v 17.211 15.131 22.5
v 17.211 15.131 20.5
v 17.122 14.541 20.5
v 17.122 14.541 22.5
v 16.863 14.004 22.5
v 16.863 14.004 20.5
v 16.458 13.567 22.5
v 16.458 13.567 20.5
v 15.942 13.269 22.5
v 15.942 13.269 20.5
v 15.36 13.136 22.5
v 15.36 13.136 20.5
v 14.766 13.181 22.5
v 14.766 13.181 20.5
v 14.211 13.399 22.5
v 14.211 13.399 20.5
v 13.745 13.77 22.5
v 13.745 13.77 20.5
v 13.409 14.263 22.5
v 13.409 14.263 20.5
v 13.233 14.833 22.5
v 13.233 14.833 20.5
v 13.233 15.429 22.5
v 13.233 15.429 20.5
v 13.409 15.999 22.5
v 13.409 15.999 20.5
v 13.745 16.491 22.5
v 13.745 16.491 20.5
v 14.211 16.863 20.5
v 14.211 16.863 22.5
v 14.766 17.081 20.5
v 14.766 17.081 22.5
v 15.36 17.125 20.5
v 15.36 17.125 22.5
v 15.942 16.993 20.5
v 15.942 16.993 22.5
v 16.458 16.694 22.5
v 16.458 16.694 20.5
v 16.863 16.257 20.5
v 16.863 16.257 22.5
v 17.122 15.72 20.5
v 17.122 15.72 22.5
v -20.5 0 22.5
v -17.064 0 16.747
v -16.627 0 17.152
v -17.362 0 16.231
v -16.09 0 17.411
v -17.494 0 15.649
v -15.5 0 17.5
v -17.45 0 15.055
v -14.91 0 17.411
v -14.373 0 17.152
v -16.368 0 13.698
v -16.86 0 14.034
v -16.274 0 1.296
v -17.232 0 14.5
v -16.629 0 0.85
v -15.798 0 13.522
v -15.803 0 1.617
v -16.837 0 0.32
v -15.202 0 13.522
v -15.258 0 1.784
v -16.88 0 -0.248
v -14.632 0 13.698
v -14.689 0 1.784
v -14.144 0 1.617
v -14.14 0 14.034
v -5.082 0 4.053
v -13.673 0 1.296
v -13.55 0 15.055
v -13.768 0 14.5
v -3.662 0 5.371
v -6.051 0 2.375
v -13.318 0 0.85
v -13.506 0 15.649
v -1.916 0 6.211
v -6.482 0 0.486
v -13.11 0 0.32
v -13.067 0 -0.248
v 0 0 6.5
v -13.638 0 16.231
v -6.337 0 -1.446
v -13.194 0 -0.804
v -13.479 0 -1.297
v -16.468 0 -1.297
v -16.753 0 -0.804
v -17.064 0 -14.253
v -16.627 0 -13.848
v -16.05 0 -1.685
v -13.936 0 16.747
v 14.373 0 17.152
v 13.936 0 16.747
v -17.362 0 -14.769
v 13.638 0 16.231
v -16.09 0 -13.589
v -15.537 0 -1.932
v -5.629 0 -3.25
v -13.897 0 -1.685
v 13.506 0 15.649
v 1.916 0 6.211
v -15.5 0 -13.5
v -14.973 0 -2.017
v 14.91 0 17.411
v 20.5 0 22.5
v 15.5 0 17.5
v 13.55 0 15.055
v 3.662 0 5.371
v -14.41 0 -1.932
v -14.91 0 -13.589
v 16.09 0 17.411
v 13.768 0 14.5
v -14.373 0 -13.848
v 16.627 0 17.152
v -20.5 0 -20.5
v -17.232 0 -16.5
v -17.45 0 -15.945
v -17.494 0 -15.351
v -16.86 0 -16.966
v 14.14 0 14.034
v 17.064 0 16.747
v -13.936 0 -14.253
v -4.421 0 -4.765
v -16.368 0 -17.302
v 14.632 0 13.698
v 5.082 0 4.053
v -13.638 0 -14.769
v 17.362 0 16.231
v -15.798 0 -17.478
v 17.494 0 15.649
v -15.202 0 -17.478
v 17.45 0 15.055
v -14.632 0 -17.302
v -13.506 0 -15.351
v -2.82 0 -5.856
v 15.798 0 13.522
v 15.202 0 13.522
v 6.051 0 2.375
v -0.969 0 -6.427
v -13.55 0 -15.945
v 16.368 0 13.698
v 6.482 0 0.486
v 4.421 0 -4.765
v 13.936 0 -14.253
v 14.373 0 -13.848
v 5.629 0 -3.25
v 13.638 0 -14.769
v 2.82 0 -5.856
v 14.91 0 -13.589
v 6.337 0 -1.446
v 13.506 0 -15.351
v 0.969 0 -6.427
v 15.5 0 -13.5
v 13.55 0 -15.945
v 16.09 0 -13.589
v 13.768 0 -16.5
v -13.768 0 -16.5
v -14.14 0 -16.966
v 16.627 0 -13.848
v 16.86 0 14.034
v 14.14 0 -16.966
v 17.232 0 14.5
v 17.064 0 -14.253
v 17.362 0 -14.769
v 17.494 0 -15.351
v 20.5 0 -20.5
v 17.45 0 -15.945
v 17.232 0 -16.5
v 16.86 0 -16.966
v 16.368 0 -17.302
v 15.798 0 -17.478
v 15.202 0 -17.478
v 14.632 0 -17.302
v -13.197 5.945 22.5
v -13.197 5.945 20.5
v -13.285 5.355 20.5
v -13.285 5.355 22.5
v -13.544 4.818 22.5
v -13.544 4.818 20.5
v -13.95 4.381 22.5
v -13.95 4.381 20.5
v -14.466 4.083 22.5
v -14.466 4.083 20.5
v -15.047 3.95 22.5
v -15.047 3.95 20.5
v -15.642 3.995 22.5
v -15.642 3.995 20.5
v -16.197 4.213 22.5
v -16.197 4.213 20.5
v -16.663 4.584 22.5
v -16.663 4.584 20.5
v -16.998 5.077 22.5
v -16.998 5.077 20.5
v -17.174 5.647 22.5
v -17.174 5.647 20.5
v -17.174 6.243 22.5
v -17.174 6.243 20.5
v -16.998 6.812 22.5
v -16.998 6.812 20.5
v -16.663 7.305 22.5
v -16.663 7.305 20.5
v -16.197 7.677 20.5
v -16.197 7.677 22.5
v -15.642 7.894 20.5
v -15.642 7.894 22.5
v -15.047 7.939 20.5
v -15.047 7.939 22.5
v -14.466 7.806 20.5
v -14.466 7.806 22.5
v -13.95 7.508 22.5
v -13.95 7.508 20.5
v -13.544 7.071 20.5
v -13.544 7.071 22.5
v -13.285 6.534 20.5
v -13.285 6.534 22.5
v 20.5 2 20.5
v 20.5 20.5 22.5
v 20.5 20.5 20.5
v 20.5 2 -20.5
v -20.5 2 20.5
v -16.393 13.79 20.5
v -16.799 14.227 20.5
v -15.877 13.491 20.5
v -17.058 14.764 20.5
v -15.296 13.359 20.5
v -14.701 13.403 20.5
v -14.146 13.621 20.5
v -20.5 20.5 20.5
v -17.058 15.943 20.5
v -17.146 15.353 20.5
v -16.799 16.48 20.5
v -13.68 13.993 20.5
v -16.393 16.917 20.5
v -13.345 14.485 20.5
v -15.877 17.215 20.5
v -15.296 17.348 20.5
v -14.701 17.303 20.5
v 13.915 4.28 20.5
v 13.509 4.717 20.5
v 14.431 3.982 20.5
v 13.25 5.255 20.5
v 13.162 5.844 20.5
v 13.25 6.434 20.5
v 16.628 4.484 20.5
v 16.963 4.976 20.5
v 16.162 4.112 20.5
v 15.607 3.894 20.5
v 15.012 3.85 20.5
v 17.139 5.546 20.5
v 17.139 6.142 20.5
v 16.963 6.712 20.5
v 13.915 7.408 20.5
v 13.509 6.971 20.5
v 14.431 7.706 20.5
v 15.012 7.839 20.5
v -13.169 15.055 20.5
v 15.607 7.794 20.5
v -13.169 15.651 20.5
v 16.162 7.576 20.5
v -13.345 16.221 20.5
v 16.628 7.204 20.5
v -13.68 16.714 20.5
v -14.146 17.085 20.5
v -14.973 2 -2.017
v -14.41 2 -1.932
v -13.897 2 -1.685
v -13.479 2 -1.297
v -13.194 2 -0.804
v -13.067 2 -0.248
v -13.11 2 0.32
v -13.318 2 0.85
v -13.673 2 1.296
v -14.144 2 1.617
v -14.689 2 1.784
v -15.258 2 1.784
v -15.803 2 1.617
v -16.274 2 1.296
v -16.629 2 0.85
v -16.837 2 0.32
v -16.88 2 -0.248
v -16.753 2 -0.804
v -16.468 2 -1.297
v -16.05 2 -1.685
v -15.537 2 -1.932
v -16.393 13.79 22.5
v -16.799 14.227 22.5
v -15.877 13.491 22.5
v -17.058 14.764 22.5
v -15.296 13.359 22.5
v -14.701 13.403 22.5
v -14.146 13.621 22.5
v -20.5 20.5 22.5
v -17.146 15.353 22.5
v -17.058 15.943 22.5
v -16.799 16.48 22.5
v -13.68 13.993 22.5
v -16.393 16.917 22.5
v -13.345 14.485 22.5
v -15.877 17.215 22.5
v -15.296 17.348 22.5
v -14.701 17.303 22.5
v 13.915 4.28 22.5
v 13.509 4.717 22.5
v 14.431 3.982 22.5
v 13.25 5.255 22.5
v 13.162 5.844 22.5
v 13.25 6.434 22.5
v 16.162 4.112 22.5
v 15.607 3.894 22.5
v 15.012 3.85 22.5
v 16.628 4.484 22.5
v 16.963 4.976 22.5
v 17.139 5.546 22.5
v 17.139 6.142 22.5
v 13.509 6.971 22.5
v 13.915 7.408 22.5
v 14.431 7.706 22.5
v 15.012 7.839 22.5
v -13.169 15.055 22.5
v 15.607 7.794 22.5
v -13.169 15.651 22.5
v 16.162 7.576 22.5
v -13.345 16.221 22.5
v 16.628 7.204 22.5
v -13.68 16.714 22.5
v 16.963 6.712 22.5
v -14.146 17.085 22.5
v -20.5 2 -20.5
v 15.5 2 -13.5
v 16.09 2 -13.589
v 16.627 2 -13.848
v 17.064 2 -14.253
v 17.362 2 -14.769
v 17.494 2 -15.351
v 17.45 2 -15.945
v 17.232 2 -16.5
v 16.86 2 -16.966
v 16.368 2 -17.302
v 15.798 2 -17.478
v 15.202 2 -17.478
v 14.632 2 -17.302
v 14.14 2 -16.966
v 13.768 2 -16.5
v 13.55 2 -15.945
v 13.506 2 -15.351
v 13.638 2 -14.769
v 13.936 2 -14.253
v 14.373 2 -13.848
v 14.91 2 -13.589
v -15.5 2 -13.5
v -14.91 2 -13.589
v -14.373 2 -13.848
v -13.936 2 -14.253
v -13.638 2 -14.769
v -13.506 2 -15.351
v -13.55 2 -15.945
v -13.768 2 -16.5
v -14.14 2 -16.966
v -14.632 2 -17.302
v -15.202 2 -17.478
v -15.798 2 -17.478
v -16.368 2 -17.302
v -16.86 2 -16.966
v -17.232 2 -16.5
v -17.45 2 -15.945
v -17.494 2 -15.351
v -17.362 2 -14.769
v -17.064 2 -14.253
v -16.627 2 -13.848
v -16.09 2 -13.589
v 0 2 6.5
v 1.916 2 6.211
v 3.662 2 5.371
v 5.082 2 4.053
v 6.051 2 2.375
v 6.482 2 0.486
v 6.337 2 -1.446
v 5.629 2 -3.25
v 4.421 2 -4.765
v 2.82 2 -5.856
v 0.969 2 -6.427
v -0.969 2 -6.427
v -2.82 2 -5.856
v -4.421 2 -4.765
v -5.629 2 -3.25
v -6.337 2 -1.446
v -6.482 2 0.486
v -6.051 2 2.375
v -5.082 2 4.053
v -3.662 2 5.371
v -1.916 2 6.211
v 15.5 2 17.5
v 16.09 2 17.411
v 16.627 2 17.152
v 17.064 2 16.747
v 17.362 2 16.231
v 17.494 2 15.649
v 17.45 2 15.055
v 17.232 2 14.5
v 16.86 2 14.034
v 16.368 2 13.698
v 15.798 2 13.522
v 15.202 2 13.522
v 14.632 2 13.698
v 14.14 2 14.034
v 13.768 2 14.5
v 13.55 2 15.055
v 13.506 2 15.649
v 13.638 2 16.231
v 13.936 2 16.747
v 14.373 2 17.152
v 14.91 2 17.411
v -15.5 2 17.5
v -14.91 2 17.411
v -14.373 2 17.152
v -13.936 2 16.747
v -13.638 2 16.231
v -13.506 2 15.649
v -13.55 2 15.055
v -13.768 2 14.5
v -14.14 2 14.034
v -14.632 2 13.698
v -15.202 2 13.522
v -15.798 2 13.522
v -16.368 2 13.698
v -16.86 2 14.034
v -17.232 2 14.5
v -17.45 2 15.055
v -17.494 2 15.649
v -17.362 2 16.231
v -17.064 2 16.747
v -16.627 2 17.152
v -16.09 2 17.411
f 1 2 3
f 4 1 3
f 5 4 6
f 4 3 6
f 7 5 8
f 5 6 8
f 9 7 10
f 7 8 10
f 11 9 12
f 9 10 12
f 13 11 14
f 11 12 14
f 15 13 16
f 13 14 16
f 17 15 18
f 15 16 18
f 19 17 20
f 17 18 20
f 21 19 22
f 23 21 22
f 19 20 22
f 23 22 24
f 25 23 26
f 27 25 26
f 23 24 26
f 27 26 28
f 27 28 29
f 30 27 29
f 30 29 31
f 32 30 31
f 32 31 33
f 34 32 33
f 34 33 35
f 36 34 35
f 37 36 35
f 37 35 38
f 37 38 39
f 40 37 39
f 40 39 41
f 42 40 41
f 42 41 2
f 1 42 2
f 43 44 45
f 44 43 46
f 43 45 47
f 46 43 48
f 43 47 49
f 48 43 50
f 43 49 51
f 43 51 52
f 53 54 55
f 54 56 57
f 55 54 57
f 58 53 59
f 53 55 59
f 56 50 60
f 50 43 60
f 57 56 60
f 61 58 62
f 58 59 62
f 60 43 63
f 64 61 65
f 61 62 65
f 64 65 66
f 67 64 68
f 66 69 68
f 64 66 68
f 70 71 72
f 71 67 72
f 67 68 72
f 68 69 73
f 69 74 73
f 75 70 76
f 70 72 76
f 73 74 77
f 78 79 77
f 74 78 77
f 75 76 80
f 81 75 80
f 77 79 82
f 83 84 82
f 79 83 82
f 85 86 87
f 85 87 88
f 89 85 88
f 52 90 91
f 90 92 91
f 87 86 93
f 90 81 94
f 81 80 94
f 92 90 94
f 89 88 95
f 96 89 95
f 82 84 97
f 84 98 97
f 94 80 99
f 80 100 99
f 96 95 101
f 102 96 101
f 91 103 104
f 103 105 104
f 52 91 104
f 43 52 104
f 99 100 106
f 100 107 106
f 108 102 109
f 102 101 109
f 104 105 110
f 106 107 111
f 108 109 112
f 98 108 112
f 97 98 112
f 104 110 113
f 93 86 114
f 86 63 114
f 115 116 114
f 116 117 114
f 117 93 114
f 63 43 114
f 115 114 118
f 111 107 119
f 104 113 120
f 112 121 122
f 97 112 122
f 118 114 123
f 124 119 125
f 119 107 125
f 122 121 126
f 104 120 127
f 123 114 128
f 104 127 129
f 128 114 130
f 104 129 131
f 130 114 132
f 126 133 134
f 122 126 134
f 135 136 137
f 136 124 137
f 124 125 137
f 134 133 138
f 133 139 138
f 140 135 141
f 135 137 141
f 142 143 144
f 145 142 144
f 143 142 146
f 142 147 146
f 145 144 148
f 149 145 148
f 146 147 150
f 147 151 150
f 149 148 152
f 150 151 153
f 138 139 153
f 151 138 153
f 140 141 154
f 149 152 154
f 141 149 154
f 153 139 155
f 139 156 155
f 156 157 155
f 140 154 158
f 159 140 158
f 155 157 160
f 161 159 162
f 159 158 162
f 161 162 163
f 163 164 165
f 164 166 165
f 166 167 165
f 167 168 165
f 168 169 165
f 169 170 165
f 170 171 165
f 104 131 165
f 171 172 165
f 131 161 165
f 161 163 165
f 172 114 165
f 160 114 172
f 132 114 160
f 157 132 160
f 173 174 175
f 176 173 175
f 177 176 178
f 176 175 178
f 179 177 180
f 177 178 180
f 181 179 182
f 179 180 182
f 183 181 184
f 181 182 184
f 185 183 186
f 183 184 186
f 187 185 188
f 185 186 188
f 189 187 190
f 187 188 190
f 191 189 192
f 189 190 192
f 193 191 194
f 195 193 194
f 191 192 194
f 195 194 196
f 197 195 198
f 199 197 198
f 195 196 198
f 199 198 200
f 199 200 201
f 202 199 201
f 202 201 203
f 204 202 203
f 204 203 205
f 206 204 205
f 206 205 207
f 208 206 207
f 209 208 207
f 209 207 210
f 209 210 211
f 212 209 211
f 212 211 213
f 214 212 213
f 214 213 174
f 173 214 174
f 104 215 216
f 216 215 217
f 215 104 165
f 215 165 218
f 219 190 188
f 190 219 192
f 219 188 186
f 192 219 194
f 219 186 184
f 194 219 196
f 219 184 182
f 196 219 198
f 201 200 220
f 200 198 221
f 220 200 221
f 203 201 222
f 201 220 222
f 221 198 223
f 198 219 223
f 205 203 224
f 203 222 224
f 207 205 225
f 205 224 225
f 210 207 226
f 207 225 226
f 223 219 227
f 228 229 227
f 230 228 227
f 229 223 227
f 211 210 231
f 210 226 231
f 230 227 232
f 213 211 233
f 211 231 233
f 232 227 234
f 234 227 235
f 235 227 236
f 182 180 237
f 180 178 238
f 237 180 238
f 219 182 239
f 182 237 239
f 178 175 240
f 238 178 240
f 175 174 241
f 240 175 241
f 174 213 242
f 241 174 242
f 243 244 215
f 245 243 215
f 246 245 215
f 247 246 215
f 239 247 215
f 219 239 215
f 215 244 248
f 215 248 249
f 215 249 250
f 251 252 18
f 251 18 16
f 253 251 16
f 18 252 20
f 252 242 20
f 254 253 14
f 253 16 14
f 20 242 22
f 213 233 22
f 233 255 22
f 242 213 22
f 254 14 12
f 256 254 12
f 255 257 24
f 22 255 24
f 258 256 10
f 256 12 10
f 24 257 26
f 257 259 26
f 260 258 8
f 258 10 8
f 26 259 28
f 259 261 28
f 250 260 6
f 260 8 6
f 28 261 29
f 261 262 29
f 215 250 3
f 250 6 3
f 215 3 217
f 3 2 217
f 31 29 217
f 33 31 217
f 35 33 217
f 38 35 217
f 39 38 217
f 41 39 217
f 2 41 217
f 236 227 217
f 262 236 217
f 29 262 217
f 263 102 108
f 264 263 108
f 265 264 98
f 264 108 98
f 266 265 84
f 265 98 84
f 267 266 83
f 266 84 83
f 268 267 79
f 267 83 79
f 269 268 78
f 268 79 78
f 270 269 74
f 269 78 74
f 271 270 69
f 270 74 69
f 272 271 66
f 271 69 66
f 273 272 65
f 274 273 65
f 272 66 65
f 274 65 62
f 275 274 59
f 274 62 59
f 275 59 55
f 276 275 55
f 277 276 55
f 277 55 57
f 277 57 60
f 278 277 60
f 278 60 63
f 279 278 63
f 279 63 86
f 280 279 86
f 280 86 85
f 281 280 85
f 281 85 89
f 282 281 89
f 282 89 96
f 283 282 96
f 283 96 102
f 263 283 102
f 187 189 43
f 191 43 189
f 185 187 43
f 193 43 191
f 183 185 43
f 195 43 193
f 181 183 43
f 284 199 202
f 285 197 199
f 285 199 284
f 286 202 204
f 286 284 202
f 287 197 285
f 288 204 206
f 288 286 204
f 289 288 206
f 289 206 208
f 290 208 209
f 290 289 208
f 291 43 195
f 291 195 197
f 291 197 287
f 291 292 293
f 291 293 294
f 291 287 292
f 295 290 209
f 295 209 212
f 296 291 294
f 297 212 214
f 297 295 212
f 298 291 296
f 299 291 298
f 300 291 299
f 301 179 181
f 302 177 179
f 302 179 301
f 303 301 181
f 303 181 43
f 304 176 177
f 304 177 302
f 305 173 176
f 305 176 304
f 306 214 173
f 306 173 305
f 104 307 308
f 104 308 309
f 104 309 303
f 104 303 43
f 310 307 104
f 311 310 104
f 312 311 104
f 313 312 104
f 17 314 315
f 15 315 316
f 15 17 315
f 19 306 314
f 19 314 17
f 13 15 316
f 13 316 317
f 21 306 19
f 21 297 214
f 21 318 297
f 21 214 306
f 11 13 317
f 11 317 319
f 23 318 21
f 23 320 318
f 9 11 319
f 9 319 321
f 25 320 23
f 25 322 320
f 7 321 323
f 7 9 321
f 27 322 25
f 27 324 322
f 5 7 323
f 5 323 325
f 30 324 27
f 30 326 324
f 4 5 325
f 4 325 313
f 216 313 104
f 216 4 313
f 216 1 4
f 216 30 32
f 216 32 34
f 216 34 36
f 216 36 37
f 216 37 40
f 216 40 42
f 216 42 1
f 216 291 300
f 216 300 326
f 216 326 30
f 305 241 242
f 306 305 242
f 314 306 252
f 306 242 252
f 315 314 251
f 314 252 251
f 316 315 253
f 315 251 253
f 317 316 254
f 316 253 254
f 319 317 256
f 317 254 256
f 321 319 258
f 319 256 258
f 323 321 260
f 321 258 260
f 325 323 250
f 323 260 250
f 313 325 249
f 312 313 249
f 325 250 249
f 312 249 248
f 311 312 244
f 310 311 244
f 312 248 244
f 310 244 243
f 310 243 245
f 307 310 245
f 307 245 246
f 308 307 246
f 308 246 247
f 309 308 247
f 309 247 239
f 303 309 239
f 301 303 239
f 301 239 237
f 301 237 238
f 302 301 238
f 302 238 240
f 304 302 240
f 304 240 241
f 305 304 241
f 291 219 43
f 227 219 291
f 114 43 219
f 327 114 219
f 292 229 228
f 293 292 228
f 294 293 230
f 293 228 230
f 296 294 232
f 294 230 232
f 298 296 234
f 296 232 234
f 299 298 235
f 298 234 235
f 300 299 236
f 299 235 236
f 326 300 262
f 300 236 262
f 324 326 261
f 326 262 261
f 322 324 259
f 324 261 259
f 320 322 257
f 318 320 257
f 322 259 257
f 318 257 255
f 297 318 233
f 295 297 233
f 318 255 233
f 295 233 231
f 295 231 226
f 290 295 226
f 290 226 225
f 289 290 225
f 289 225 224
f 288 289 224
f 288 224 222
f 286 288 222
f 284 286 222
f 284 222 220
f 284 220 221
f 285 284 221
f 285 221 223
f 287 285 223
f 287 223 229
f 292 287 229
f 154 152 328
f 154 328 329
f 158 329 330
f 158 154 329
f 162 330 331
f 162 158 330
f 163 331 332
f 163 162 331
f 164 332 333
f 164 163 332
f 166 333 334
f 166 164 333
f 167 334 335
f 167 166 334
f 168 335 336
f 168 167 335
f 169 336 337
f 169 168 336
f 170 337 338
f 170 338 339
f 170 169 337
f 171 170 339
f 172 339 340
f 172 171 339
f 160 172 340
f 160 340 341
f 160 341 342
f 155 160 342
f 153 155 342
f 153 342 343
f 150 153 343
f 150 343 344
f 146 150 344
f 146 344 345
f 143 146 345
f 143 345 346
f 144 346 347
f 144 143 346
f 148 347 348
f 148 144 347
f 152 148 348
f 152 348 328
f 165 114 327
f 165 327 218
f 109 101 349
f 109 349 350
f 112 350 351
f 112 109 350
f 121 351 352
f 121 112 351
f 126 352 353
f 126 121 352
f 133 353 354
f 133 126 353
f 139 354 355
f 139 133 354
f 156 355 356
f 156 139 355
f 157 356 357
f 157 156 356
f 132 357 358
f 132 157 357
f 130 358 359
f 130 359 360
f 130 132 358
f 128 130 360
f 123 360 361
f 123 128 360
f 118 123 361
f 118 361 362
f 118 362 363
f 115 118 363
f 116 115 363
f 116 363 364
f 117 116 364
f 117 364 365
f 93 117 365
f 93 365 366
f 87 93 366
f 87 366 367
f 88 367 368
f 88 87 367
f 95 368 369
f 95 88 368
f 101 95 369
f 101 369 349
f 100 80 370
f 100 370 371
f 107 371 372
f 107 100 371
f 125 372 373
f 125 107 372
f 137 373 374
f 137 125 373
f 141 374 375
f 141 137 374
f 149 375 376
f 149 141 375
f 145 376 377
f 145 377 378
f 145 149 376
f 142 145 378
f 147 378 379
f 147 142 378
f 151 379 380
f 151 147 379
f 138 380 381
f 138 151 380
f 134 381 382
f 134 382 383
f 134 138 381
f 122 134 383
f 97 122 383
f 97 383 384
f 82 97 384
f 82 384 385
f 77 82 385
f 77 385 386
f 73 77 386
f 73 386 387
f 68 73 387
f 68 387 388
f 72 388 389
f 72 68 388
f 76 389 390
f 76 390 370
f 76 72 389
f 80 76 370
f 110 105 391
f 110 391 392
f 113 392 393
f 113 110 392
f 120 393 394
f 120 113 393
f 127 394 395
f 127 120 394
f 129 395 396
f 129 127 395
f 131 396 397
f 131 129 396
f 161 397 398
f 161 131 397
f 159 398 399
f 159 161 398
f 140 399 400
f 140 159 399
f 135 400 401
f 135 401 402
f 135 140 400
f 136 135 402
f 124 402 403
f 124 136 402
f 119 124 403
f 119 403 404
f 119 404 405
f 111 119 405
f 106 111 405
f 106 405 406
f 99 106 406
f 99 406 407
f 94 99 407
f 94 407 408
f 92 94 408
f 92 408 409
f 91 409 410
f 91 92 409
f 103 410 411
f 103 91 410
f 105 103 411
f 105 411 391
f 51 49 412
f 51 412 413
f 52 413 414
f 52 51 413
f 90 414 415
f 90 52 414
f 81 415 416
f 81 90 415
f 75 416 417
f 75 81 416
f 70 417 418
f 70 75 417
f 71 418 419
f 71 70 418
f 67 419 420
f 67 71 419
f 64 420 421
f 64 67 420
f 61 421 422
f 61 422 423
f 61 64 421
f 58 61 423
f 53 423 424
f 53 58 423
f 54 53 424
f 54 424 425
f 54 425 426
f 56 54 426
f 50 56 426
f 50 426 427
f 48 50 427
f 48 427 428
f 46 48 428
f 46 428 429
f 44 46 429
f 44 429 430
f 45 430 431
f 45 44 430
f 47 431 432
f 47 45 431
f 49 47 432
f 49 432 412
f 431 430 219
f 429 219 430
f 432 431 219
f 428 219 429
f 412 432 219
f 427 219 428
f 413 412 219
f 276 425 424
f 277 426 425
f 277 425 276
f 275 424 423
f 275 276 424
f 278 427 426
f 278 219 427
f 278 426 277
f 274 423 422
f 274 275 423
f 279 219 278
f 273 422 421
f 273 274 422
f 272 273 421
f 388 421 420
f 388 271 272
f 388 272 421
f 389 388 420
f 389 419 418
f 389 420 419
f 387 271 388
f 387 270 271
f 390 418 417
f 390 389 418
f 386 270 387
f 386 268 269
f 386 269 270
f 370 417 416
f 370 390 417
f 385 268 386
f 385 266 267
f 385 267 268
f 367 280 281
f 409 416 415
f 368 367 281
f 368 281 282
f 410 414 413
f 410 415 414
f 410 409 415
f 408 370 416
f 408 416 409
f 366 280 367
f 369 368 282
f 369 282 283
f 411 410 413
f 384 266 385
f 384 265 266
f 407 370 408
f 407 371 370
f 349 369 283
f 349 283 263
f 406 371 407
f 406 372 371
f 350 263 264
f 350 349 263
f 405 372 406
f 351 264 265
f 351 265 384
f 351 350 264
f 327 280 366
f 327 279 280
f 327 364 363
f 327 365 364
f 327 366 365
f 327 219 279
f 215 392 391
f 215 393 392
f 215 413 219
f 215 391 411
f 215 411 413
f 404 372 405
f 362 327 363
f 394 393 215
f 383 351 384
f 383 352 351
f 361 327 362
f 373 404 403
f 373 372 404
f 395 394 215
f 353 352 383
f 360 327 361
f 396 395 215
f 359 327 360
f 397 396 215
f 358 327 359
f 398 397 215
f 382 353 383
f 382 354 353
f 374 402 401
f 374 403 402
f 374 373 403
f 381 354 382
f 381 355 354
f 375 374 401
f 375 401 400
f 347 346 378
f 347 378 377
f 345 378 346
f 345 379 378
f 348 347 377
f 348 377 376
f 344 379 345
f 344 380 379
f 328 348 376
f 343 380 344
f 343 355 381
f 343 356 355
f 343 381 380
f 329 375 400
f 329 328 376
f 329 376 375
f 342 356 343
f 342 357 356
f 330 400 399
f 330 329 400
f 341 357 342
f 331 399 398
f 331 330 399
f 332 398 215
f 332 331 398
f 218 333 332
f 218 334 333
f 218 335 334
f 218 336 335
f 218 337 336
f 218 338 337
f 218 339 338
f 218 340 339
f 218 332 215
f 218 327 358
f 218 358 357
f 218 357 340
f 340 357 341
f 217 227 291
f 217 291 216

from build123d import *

# Parameters (mm, degrees)
SKETCH1_W           = 41
SKETCH1_H           = 41
SKETCH1_R           = 2
SKETCH1_R_2         = 6.5
BOSS_EXTRUDE1_DEPTH = 2
SKETCH2_W           = 41
SKETCH2_H           = 20.5
BOSS_EXTRUDE2_DEPTH = 2
SKETCH3_R           = 2
CUT_EXTRUDE1_DEPTH  = 10
SKETCH6_R           = 1.911397566
CUT_EXTRUDE4_DEPTH  = 10


with BuildPart() as part:
    # Sketch1 → Boss-Extrude1 (new body)
    with BuildSketch(Plane(origin=(0, 0, 0), x_dir=(1, 0, 0), z_dir=(0, 1, 0))):
        Rectangle(SKETCH1_W, SKETCH1_H)
        with Locations(Location((-15.5, -15.5, 0), (0, 0, 270))):
            Circle(SKETCH1_R, mode=Mode.SUBTRACT)
        with Locations(Location((-15.5, 15.5, 0), (0, 0, 270))):
            Circle(SKETCH1_R, mode=Mode.SUBTRACT)
        with Locations(Location((15.5, 15.5, 0), (0, 0, 270))):
            Circle(SKETCH1_R, mode=Mode.SUBTRACT)
        with Locations(Location((0, 0, 0), (0, 0, 270))):
            Circle(SKETCH1_R_2, mode=Mode.SUBTRACT)
        with Locations(Location((15.5, -15.5, 0), (0, 0, 270))):
            Circle(SKETCH1_R, mode=Mode.SUBTRACT)
    extrude(amount=BOSS_EXTRUDE1_DEPTH)

    # Sketch2 → Boss-Extrude2 (add)
    with BuildSketch(Plane.XY.offset(20.5)):
        with Locations((0, 10.25)):
            Rectangle(SKETCH2_W, SKETCH2_H)
    extrude(amount=BOSS_EXTRUDE2_DEPTH)

    # Sketch3 → Cut-Extrude1 (cut)
    with BuildSketch(Plane(origin=(0, 0, 20.5), x_dir=(-1, 0, 0), z_dir=(0, 0, -1))):
        with Locations((-15.161511711, 5.844100373)):
            Circle(SKETCH3_R)
        with Locations((15.146476182, 15.353198296)):
            Circle(SKETCH3_R)
        with Locations(Location((-15.210908875, 15.130767232, 0), (0, 0, 180))):
            Circle(SKETCH3_R)
        with Locations(Location((15.196521792, 5.944623662, 0), (0, 0, 180))):
            Circle(SKETCH3_R)
    extrude(amount=-CUT_EXTRUDE1_DEPTH, mode=Mode.SUBTRACT)

    # Sketch6 → Cut-Extrude4 (cut)
    with BuildSketch(Plane(origin=(0, 0, 0), x_dir=(-1, 0, 0), z_dir=(0, -1, 0))):
        with Locations(Location((14.973447389, 0.105568023, 0), (0, 0, 90))):
            Circle(SKETCH6_R)
    extrude(amount=-CUT_EXTRUDE4_DEPTH, mode=Mode.SUBTRACT)


solid = part.part
